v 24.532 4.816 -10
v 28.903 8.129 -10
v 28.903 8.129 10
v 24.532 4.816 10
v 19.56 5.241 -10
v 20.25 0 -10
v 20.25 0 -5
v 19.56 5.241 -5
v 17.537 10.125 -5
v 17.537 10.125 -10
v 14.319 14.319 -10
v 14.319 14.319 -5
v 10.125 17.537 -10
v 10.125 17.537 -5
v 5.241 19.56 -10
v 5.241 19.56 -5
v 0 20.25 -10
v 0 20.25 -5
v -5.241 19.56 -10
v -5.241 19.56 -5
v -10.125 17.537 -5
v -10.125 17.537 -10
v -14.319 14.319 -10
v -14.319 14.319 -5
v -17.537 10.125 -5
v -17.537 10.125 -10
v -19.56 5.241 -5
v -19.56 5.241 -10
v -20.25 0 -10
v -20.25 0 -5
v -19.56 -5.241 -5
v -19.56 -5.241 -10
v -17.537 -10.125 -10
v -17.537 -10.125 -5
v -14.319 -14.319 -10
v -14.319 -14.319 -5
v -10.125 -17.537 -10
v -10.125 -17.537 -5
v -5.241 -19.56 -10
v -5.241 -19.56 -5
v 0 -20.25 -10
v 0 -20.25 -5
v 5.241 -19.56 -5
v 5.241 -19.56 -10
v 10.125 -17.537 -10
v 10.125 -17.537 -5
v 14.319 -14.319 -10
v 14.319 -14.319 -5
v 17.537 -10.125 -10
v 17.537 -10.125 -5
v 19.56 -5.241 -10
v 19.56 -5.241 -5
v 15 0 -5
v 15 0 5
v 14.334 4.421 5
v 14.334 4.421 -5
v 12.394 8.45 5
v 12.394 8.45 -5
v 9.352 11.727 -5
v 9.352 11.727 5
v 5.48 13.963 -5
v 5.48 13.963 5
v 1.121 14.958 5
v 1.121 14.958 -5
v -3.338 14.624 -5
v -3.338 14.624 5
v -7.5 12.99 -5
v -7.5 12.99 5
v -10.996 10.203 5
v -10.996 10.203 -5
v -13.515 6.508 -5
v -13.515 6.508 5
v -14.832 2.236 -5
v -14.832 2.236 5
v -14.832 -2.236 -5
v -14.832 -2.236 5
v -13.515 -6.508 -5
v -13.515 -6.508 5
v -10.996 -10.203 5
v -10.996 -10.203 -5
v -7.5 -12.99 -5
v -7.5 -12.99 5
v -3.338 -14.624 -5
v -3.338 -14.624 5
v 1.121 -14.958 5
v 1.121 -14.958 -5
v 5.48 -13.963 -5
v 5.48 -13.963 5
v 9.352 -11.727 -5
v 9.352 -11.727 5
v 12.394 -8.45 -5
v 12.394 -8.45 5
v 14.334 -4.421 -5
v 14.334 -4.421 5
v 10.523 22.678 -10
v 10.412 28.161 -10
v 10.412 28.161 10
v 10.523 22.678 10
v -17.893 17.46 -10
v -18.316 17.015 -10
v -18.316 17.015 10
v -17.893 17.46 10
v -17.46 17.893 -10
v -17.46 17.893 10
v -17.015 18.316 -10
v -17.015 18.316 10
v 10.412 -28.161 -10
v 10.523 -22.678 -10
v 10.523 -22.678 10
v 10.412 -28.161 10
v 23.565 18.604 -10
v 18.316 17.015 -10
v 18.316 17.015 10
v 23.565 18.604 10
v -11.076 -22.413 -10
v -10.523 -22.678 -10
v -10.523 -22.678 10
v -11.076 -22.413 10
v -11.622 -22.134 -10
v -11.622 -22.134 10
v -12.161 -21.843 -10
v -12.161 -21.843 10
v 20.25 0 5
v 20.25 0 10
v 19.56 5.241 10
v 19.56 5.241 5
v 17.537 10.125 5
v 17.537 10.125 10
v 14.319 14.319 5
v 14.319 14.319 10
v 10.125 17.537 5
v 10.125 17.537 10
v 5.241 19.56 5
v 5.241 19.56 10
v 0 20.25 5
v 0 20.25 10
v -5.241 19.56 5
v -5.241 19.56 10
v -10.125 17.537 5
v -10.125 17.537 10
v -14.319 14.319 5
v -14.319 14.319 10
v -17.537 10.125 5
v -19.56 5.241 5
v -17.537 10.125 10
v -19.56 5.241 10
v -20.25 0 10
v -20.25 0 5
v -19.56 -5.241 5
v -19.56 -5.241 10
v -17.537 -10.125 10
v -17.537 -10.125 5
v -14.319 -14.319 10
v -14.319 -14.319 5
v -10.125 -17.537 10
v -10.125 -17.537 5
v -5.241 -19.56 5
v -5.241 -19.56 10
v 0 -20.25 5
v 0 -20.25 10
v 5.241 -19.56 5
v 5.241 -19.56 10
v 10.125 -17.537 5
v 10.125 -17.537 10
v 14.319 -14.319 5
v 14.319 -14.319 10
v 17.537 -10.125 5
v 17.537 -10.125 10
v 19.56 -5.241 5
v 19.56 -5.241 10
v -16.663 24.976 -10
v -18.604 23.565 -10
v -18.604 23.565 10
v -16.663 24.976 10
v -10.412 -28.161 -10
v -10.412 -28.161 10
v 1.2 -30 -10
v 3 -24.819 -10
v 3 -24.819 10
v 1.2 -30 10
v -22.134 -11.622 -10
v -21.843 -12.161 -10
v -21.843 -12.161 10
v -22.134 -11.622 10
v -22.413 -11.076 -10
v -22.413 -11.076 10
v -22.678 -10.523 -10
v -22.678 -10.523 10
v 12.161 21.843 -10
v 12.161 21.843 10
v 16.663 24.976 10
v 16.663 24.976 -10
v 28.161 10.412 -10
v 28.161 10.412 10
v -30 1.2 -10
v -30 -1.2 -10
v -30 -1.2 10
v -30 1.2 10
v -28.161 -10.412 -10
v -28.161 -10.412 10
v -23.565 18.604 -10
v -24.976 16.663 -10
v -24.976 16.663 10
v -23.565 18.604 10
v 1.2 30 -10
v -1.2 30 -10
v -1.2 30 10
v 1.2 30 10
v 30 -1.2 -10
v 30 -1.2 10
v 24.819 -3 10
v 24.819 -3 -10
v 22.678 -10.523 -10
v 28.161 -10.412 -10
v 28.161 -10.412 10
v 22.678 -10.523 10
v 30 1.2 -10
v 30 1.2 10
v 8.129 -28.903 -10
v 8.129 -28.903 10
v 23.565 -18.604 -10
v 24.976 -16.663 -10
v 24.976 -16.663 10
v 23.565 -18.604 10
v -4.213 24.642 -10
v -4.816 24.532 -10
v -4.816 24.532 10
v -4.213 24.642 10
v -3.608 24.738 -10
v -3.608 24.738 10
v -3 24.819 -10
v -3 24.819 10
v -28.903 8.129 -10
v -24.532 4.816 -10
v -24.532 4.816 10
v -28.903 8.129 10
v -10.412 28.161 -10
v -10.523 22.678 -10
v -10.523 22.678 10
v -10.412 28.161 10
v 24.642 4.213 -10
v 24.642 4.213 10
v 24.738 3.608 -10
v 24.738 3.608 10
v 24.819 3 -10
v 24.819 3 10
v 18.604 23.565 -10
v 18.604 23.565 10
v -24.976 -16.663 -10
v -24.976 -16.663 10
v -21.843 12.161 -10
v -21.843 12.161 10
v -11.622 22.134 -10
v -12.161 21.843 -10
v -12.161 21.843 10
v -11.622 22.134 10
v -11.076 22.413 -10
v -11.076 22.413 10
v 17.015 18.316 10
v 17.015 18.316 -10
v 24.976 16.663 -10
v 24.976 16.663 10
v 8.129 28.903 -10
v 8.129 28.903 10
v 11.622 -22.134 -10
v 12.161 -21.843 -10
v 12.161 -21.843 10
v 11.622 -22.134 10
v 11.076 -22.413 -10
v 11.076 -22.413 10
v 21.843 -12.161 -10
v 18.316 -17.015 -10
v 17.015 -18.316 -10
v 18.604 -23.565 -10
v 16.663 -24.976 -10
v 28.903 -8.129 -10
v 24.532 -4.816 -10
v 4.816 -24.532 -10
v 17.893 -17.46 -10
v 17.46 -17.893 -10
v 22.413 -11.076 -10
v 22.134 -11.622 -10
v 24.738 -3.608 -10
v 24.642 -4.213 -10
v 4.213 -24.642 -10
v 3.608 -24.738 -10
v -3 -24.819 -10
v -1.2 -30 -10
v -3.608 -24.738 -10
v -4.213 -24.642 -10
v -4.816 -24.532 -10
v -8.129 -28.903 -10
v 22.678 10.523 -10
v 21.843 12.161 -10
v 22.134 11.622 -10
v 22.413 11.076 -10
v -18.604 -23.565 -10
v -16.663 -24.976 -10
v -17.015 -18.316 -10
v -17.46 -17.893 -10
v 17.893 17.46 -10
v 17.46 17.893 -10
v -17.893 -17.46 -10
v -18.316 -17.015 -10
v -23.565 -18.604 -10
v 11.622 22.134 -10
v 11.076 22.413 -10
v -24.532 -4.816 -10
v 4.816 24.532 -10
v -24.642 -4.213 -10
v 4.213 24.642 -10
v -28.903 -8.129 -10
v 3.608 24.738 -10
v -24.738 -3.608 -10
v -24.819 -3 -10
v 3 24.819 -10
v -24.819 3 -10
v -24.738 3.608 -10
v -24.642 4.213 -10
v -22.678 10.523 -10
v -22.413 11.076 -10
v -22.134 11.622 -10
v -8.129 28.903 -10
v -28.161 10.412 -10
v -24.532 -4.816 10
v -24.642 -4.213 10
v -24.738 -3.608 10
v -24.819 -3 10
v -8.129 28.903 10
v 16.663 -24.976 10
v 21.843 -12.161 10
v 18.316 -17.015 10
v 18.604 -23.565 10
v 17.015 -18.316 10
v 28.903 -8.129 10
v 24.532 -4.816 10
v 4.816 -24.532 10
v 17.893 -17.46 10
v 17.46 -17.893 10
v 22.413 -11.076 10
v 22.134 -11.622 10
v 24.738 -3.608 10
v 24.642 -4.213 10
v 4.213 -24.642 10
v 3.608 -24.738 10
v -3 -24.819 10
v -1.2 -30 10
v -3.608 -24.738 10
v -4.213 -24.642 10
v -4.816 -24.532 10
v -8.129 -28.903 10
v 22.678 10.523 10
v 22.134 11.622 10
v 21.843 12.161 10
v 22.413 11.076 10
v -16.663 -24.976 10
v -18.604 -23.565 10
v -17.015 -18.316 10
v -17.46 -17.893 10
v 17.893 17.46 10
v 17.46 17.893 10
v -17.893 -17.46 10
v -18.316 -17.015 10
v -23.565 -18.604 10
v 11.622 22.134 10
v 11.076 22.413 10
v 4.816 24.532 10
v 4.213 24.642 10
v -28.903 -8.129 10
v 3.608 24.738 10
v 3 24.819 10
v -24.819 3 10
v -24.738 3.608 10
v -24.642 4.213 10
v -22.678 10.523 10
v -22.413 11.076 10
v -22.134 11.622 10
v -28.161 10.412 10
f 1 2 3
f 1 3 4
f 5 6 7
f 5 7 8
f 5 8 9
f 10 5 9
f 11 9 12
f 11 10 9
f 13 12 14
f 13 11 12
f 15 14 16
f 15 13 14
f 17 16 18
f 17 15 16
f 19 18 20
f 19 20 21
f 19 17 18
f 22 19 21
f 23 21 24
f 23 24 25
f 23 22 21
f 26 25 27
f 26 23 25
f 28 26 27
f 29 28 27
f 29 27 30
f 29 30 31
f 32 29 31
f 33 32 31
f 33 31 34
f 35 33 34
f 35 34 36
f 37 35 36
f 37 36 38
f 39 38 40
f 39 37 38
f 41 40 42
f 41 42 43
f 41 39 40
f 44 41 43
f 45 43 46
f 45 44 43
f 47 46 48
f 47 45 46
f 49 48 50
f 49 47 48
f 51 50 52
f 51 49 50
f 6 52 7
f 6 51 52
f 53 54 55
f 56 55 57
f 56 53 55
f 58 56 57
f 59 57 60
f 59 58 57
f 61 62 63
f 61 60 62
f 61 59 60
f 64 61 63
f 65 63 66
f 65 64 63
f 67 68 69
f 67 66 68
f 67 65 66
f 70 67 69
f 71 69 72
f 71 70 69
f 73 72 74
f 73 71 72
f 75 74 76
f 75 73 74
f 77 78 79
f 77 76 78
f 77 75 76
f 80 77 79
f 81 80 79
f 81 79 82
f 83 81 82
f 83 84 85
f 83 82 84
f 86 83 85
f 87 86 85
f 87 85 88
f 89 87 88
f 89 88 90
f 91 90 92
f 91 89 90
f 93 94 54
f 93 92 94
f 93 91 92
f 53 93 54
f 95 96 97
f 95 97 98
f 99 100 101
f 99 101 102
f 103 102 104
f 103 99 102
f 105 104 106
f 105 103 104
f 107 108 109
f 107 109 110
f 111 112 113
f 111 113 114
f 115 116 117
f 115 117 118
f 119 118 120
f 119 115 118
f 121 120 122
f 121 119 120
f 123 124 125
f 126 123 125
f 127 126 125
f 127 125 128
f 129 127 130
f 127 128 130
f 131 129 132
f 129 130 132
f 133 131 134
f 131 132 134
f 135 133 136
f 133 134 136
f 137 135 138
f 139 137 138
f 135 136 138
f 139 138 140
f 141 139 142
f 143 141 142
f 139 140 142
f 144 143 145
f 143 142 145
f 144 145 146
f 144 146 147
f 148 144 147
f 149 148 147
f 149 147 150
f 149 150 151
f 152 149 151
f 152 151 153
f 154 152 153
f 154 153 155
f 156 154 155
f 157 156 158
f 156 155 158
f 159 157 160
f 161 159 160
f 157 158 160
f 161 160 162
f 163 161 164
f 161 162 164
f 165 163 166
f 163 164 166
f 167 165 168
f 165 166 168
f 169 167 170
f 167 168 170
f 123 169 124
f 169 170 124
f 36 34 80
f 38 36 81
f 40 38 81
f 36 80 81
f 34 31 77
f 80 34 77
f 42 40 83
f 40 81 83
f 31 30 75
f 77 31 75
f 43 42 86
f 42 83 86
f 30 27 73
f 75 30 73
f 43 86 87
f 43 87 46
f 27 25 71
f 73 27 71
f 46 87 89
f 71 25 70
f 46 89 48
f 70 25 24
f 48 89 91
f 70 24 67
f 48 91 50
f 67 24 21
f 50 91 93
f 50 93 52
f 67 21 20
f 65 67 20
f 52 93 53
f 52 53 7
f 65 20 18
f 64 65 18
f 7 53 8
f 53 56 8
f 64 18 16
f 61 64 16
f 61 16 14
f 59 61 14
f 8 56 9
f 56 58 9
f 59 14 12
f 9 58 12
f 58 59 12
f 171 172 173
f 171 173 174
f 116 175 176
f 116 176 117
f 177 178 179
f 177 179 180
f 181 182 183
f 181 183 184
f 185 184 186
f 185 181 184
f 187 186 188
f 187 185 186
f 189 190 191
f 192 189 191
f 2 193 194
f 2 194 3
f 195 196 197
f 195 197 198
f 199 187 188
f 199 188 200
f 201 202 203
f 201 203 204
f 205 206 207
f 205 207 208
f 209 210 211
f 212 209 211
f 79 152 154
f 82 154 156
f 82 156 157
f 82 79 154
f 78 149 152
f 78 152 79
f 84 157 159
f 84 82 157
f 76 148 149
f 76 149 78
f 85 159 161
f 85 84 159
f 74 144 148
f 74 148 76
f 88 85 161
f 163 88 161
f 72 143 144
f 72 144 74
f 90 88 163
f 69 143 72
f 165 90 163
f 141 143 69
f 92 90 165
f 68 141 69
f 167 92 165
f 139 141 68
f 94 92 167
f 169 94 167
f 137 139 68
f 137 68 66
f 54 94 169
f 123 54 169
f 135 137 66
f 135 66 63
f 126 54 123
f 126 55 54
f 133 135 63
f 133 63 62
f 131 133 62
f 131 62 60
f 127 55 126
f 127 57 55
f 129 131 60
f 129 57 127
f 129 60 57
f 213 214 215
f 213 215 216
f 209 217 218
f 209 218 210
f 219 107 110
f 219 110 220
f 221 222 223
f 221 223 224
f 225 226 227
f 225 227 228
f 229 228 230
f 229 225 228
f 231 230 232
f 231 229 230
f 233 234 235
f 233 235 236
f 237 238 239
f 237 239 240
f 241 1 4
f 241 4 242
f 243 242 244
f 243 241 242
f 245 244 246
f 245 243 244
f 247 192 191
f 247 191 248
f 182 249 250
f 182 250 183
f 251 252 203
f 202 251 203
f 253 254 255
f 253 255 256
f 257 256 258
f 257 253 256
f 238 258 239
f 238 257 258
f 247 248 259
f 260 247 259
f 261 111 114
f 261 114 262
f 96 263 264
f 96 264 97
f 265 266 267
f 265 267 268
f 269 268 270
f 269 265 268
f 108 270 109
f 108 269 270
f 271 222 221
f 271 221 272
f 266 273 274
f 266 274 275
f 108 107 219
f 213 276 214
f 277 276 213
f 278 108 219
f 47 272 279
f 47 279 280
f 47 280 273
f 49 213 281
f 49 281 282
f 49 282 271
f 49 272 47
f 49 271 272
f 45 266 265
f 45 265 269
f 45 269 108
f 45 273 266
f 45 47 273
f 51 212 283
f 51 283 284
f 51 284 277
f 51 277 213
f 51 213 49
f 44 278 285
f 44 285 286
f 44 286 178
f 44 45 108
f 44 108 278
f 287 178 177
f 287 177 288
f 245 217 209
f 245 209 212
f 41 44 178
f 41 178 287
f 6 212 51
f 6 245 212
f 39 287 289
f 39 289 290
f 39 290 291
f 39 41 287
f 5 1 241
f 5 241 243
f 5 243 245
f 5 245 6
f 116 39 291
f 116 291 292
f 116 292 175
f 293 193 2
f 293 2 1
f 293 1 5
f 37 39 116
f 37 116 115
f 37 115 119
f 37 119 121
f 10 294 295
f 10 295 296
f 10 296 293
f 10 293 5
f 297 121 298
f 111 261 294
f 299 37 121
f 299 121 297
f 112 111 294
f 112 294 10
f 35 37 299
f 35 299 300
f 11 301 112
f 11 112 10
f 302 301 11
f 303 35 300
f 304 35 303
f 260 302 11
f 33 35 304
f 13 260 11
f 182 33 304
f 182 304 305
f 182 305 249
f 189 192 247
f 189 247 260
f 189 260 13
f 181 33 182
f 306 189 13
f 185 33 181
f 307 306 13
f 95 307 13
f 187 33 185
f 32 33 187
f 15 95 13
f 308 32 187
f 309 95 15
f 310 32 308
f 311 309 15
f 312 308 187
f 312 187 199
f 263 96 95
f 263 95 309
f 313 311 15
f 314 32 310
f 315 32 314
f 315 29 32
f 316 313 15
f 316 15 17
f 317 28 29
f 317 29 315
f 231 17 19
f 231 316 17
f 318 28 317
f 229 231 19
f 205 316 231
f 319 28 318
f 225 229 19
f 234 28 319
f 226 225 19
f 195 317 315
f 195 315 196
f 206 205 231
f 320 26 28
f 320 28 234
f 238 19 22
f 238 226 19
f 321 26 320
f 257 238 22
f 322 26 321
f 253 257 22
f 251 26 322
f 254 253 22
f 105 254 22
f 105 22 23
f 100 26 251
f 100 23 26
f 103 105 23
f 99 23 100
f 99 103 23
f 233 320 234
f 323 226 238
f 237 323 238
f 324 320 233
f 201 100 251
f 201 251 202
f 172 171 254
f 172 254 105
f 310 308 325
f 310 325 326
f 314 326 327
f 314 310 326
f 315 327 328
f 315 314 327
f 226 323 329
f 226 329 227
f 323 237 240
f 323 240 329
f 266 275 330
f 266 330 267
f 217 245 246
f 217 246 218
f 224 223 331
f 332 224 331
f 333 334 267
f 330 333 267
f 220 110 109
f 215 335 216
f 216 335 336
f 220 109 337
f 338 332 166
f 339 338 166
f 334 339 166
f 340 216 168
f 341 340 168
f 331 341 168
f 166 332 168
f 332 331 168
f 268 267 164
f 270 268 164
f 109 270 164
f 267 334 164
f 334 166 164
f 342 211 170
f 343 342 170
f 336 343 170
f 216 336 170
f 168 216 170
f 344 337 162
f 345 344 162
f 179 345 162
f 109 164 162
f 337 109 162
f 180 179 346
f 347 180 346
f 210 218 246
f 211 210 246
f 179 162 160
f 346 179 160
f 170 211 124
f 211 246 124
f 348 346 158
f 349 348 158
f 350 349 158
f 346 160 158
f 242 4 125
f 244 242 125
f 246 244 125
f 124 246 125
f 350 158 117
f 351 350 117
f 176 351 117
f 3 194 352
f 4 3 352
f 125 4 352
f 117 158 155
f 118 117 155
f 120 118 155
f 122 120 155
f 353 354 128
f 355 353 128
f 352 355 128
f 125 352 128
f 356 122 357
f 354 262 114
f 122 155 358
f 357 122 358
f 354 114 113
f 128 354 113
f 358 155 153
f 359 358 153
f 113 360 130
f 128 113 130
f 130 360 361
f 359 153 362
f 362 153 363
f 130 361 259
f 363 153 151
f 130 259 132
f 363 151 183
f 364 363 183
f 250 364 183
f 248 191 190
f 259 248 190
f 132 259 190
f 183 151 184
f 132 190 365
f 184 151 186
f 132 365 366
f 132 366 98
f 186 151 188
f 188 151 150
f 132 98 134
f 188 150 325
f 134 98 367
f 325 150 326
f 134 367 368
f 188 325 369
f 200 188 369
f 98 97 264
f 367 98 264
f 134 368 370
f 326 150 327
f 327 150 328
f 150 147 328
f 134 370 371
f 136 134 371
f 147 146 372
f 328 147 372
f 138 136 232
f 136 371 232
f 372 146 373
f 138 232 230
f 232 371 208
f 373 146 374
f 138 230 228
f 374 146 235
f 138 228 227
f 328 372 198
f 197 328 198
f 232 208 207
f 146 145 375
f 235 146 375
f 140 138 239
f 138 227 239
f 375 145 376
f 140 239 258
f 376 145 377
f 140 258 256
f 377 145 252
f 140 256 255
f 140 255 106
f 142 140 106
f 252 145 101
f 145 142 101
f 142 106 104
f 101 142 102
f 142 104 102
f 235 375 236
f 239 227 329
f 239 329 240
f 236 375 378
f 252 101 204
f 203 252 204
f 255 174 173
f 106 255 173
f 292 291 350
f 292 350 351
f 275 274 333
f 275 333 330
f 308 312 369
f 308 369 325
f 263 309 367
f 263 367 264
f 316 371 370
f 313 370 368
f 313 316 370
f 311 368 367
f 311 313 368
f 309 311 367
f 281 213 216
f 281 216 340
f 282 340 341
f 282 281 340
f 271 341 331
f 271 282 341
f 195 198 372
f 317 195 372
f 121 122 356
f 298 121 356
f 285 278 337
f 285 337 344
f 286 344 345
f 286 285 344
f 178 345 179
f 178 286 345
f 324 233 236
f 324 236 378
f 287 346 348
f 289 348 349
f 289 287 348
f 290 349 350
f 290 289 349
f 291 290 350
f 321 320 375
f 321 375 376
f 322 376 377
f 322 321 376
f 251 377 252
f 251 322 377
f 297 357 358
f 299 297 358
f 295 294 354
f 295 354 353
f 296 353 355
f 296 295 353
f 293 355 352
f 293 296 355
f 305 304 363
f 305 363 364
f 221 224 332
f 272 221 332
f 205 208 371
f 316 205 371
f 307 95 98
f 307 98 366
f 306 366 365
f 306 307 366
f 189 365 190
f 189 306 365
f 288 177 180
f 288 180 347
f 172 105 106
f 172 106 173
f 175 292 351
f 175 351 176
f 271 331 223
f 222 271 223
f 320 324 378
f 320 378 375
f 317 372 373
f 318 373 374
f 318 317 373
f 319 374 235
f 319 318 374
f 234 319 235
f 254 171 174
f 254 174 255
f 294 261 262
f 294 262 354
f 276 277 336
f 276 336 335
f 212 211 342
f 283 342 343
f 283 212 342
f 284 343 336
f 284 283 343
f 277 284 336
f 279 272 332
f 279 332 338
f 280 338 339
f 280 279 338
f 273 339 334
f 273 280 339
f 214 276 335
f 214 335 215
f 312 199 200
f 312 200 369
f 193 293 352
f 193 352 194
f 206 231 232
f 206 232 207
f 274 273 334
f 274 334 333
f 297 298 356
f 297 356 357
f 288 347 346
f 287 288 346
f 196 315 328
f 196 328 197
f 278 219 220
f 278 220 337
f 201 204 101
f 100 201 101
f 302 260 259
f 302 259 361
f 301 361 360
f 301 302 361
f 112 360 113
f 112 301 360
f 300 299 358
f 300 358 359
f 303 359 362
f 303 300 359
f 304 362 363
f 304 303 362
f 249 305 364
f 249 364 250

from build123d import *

# Parameters (mm, degrees)
BOSS_EXTRUDE1_DEPTH      = 10
BOSS_EXTRUDE1_DEPTH_BACK = 10
SKETCH1_R                = 15
SKETCH2_R                = 20.25
CUT_EXTRUDE1_DEPTH       = 5


with BuildPart() as part:
    # Sketch1 → Boss-Extrude1 (new, two sides: drawn at the far end of the back side and taken through both)
    with BuildSketch(Plane.XY.offset(-BOSS_EXTRUDE1_DEPTH_BACK)):
        with BuildLine():
            Line((-1.2, 30), (1.2, 30))
            Line((1.2, 30), (3, 24.819347292))
            ThreePointArc((3, 24.819347292), (3.910861626, 24.692208515), (4.816430554, 24.531652955))
            Line((4.816430554, 24.531652955), (8.129242012, 28.902515882))
            Line((8.129242012, 28.902515882), (10.411777651, 28.160875096))
            Line((10.411777651, 28.160875096), (10.522769651, 22.677550989))
            ThreePointArc((10.522769651, 22.677550989), (11.349762493, 22.275163105), (12.161395327, 21.842629505))
            Line((12.161395327, 21.842629505), (16.662737176, 24.975852134))
            Line((16.662737176, 24.975852134), (18.604377962, 23.565167528))
            Line((18.604377962, 23.565167528), (17.015497293, 18.315917992))
            ThreePointArc((17.015497293, 18.315917992), (17.67766953, 17.67766953), (18.315917992, 17.015497293))
            Line((18.315917992, 17.015497293), (23.565167528, 18.604377962))
            Line((23.565167528, 18.604377962), (24.975852134, 16.662737176))
            Line((24.975852134, 16.662737176), (21.842629505, 12.161395327))
            ThreePointArc((21.842629505, 12.161395327), (22.275163105, 11.349762493), (22.677550989, 10.522769651))
            Line((22.677550989, 10.522769651), (28.160875096, 10.411777651))
            Line((28.160875096, 10.411777651), (28.902515882, 8.129242012))
            Line((28.902515882, 8.129242012), (24.531652955, 4.816430554))
            ThreePointArc((24.531652955, 4.816430554), (24.692208515, 3.910861626), (24.819347292, 3))
            Line((24.819347292, 3), (30, 1.2))
            Line((30, 1.2), (30, -1.2))
            Line((30, -1.2), (24.819347292, -3))
            ThreePointArc((24.819347292, -3), (24.692208515, -3.910861626), (24.531652955, -4.816430554))
            Line((24.531652955, -4.816430554), (28.902515882, -8.129242012))
            Line((28.902515882, -8.129242012), (28.160875096, -10.411777651))
            Line((28.160875096, -10.411777651), (22.677550989, -10.522769651))
            ThreePointArc((22.677550989, -10.522769651), (22.275163105, -11.349762493), (21.842629505, -12.161395327))
            Line((21.842629505, -12.161395327), (24.975852134, -16.662737176))
            Line((24.975852134, -16.662737176), (23.565167528, -18.604377962))
            Line((23.565167528, -18.604377962), (18.315917992, -17.015497293))
            ThreePointArc((18.315917992, -17.015497293), (17.67766953, -17.67766953), (17.015497293, -18.315917992))
            Line((17.015497293, -18.315917992), (18.604377962, -23.565167528))
            Line((18.604377962, -23.565167528), (16.662737176, -24.975852134))
            Line((16.662737176, -24.975852134), (12.161395327, -21.842629505))
            ThreePointArc((12.161395327, -21.842629505), (11.349762493, -22.275163105), (10.522769651, -22.677550989))
            Line((10.522769651, -22.677550989), (10.411777651, -28.160875096))
            Line((10.411777651, -28.160875096), (8.129242012, -28.902515882))
            Line((8.129242012, -28.902515882), (4.816430554, -24.531652955))
            ThreePointArc((4.816430554, -24.531652955), (3.910861626, -24.692208515), (3, -24.819347292))
            Line((3, -24.819347292), (1.2, -30))
            Line((1.2, -30), (-1.2, -30))
            Line((-1.2, -30), (-3, -24.819347292))
            ThreePointArc((-3, -24.819347292), (-3.910861626, -24.692208515), (-4.816430554, -24.531652955))
            Line((-4.816430554, -24.531652955), (-8.129242012, -28.902515882))
            Line((-8.129242012, -28.902515882), (-10.411777651, -28.160875096))
            Line((-10.411777651, -28.160875096), (-10.522769651, -22.677550989))
            ThreePointArc((-10.522769651, -22.677550989), (-11.349762493, -22.275163105), (-12.161395327, -21.842629505))
            Line((-12.161395327, -21.842629505), (-16.662737176, -24.975852134))
            Line((-16.662737176, -24.975852134), (-18.604377962, -23.565167528))
            Line((-18.604377962, -23.565167528), (-17.015497293, -18.315917992))
            ThreePointArc((-17.015497293, -18.315917992), (-17.67766953, -17.67766953), (-18.315917992, -17.015497293))
            Line((-18.315917992, -17.015497293), (-23.565167528, -18.604377962))
            Line((-23.565167528, -18.604377962), (-24.975852134, -16.662737176))
            Line((-24.975852134, -16.662737176), (-21.842629505, -12.161395327))
            ThreePointArc((-21.842629505, -12.161395327), (-22.275163105, -11.349762493), (-22.677550989, -10.522769651))
            Line((-22.677550989, -10.522769651), (-28.160875096, -10.411777651))
            Line((-28.160875096, -10.411777651), (-28.902515882, -8.129242012))
            Line((-28.902515882, -8.129242012), (-24.531652955, -4.816430554))
            ThreePointArc((-24.531652955, -4.816430554), (-24.692208515, -3.910861626), (-24.819347292, -3))
            Line((-24.819347292, -3), (-30, -1.2))
            Line((-30, -1.2), (-30, 1.2))
            Line((-30, 1.2), (-24.819347292, 3))
            ThreePointArc((-24.819347292, 3), (-24.692208515, 3.910861626), (-24.531652955, 4.816430554))
            Line((-24.531652955, 4.816430554), (-28.902515882, 8.129242012))
            Line((-28.902515882, 8.129242012), (-28.160875096, 10.411777651))
            Line((-28.160875096, 10.411777651), (-22.677550989, 10.522769651))
            ThreePointArc((-22.677550989, 10.522769651), (-22.275163105, 11.349762493), (-21.842629505, 12.161395327))
            Line((-21.842629505, 12.161395327), (-24.975852134, 16.662737176))
            Line((-24.975852134, 16.662737176), (-23.565167528, 18.604377962))
            Line((-23.565167528, 18.604377962), (-18.315917992, 17.015497293))
            ThreePointArc((-18.315917992, 17.015497293), (-17.67766953, 17.67766953), (-17.015497293, 18.315917992))
            Line((-17.015497293, 18.315917992), (-18.604377962, 23.565167528))
            Line((-18.604377962, 23.565167528), (-16.662737176, 24.975852134))
            Line((-16.662737176, 24.975852134), (-12.161395327, 21.842629505))
            ThreePointArc((-12.161395327, 21.842629505), (-11.349762493, 22.275163105), (-10.522769651, 22.677550989))
            Line((-10.522769651, 22.677550989), (-10.411777651, 28.160875096))
            Line((-10.411777651, 28.160875096), (-8.129242012, 28.902515882))
            Line((-8.129242012, 28.902515882), (-4.816430554, 24.531652955))
            ThreePointArc((-4.816430554, 24.531652955), (-3.910861626, 24.692208515), (-3, 24.819347292))
            Line((-3, 24.819347292), (-1.2, 30))
        make_face()
        Circle(SKETCH1_R, mode=Mode.SUBTRACT)
    extrude(amount=BOSS_EXTRUDE1_DEPTH + BOSS_EXTRUDE1_DEPTH_BACK)

    # Sketch2 → Cut-Extrude1 (cut)
    with BuildSketch(Plane.XY.offset(10)):
        Circle(SKETCH2_R)
    cut_extrude1 = extrude(amount=-CUT_EXTRUDE1_DEPTH, mode=Mode.SUBTRACT)

    # Mirror1: Cut-Extrude1 across plane
    add(cut_extrude1.mirror(Plane.XY), mode=Mode.SUBTRACT)


solid = part.part
